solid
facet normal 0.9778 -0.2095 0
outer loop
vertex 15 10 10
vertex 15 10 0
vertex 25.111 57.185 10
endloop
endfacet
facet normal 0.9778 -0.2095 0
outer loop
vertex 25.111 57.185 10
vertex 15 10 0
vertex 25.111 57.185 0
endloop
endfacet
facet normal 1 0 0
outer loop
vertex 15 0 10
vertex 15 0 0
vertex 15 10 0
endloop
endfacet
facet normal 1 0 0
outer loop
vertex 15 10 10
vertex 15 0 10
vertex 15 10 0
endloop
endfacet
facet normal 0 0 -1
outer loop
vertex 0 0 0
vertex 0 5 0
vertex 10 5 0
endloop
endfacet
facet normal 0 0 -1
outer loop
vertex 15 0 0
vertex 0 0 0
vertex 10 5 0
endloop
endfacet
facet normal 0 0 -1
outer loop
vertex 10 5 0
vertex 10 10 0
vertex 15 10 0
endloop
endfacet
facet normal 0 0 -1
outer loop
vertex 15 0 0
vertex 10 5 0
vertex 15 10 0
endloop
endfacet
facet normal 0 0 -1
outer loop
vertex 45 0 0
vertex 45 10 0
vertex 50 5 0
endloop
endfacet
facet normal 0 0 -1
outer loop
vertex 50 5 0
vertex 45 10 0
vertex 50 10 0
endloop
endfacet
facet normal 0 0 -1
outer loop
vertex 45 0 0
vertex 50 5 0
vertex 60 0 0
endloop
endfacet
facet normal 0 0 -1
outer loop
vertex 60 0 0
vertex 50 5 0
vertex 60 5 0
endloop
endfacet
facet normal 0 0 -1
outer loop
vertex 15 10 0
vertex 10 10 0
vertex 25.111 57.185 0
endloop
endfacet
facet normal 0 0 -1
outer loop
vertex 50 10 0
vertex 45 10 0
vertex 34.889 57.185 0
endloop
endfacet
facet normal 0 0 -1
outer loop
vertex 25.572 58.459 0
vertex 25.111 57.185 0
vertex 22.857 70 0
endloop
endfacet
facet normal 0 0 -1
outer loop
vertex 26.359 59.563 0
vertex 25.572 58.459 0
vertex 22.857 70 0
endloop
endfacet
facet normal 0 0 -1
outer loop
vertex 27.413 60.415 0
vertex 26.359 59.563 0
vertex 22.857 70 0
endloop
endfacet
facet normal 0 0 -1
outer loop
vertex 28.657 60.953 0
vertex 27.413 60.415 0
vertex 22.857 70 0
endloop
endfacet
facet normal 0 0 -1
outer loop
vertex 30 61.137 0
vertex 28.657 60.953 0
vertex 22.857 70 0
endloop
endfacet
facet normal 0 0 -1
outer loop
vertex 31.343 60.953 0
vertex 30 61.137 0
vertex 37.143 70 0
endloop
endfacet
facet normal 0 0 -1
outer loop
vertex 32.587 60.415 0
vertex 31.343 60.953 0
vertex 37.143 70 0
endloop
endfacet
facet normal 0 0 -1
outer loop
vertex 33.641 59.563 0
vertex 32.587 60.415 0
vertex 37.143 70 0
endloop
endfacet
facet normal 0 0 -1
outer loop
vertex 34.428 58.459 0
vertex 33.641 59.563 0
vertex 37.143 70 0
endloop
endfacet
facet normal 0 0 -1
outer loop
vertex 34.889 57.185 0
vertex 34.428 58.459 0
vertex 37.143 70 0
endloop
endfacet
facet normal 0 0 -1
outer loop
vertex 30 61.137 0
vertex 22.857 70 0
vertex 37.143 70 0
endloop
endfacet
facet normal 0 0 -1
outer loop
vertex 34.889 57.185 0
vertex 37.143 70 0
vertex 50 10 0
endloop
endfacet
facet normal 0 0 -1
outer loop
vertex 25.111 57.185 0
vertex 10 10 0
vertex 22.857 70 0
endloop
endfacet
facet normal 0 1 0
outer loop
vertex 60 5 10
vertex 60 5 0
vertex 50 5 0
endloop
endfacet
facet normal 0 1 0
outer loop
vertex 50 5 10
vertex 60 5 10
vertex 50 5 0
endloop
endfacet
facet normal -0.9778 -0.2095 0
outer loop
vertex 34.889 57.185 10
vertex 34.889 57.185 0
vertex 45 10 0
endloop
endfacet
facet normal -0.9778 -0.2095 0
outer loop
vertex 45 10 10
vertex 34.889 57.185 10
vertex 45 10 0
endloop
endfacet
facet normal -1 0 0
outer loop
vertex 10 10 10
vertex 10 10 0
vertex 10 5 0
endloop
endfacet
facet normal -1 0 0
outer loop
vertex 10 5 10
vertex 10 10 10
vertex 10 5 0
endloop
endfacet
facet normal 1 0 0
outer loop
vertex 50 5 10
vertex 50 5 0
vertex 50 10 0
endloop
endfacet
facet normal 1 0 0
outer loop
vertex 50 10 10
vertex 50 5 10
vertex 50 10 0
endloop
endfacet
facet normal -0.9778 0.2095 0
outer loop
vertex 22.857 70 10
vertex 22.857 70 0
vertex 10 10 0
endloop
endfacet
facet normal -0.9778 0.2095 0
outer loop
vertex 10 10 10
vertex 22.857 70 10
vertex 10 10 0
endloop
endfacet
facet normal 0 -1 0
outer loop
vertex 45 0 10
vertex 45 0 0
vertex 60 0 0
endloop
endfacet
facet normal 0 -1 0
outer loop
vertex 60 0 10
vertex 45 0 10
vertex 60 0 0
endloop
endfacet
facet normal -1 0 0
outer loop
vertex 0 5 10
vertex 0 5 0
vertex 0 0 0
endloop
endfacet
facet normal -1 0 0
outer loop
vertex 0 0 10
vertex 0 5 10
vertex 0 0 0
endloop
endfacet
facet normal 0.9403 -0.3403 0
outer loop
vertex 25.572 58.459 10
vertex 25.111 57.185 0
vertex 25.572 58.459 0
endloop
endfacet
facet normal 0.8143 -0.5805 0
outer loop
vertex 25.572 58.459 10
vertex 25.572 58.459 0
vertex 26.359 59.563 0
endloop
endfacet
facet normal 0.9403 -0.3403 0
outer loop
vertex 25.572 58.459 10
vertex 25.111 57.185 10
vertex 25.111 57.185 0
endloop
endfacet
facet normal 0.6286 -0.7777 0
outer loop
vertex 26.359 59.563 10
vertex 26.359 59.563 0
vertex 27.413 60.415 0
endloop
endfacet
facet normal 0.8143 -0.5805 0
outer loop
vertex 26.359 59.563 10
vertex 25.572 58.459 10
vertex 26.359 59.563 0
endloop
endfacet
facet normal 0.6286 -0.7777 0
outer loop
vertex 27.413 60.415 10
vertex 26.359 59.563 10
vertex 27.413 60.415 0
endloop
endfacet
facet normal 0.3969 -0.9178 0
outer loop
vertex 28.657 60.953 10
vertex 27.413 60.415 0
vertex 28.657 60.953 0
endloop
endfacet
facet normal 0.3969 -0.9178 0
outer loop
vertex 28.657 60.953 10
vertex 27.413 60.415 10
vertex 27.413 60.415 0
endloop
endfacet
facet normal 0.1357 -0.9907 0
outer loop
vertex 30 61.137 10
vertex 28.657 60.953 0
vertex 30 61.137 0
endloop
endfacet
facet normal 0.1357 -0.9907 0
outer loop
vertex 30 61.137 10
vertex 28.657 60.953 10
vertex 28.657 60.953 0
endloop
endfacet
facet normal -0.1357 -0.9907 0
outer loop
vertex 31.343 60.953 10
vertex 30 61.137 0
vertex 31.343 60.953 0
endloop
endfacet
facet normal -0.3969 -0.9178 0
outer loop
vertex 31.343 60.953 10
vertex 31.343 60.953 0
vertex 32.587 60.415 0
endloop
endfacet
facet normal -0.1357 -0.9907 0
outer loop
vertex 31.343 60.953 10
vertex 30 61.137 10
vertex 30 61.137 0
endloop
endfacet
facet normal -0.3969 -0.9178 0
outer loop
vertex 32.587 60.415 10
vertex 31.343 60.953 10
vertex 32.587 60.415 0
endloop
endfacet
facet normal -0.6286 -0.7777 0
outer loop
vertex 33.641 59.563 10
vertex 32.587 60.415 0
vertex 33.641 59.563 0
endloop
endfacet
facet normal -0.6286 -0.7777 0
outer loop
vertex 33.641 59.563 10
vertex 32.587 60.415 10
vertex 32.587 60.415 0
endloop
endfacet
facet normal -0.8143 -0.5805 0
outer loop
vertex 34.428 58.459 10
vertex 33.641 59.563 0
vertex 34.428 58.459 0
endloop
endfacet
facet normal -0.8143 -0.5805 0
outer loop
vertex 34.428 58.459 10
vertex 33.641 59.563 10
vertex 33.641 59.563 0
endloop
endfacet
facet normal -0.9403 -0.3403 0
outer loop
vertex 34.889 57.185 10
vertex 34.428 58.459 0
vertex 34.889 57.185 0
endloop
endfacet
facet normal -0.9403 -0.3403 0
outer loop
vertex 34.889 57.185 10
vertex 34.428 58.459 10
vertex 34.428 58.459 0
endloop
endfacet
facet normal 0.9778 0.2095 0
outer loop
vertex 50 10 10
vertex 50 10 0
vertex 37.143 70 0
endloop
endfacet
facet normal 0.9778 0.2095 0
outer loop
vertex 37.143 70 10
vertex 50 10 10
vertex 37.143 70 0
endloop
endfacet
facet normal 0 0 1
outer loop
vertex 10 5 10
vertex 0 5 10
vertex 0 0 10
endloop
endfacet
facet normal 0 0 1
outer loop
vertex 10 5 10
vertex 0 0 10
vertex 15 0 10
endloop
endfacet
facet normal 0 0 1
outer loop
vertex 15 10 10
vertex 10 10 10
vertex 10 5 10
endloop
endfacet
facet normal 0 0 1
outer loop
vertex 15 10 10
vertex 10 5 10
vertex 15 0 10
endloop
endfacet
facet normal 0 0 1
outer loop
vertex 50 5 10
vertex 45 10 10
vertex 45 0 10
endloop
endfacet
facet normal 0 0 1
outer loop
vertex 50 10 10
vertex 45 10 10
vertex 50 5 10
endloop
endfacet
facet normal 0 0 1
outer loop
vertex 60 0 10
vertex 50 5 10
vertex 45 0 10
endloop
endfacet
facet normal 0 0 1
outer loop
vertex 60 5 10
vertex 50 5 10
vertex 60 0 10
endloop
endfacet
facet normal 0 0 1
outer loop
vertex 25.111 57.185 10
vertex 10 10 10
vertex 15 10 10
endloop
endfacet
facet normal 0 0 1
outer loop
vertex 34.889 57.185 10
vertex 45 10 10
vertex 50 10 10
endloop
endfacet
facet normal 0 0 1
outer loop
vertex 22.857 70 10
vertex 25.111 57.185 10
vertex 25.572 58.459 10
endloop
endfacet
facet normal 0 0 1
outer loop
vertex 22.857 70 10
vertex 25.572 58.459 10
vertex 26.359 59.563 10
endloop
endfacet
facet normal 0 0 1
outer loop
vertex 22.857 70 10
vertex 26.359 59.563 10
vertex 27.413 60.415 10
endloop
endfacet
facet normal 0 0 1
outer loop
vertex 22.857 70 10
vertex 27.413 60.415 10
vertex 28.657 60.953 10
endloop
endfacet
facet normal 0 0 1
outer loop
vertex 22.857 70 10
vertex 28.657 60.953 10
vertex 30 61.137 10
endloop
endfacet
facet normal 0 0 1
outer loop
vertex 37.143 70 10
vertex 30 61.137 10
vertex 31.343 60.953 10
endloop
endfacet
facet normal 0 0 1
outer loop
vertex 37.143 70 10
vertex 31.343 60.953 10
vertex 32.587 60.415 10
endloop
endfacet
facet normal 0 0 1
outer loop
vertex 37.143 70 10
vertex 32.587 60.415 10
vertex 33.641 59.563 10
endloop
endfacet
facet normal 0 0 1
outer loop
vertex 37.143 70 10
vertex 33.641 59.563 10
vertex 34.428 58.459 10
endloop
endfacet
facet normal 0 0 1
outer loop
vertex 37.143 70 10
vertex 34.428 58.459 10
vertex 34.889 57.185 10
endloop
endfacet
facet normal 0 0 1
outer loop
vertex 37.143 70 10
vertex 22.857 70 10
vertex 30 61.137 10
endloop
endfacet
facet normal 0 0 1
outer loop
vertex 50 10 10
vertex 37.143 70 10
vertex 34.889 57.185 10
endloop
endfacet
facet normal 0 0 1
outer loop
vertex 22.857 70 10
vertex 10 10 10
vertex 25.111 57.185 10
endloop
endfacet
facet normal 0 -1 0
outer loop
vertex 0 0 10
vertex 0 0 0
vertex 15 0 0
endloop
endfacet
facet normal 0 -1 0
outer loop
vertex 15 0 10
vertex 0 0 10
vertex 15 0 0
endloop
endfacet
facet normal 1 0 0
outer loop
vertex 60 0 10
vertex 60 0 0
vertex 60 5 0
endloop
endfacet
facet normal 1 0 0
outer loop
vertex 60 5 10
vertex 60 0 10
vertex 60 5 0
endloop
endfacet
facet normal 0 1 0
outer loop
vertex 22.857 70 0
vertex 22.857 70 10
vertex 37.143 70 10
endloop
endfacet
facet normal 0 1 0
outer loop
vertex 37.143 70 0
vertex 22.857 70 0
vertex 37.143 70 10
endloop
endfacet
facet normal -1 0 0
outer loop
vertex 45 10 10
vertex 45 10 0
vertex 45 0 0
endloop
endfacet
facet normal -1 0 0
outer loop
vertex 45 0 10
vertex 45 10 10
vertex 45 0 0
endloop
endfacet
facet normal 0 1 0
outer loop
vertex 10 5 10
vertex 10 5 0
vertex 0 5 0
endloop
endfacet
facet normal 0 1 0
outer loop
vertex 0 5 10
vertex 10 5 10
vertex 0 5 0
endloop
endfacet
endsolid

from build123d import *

# Parameters (mm, degrees)
BOSS_EXTRUDE1_DEPTH = 10
FILLET1_R           = 5
CUT_EXTRUDE1_DEPTH  = 10


with BuildPart() as part:
    # Sketch1 → Boss-Extrude1 (new body)
    with BuildSketch(Plane.XY):
        Polygon((0, 0), (15, 0), (15, 10), (30, 80), (45, 10), (45, 0), (60, 0), (60, 5), (50, 5), (50, 10), (30, 103.333333333), (10, 10), (10, 5), (0, 5), align=None)
    extrude(amount=BOSS_EXTRUDE1_DEPTH)

    # Fillet1
    fillet1_edges = [part.edges().sort_by_distance(p)[0] for p in [
        (30, 80, 5),
    ]]
    fillet(fillet1_edges, radius=FILLET1_R)

    # Sketch2 → Cut-Extrude1 (cut)
    with BuildSketch(Plane.XY.offset(10)):
        Polygon((17.180108491, 70), (46.95074544, 70), (40.829828982, 121.012949043), (-8.691955578, 121.012949043), align=None)
    extrude(amount=-CUT_EXTRUDE1_DEPTH, mode=Mode.SUBTRACT)


solid = part.part
